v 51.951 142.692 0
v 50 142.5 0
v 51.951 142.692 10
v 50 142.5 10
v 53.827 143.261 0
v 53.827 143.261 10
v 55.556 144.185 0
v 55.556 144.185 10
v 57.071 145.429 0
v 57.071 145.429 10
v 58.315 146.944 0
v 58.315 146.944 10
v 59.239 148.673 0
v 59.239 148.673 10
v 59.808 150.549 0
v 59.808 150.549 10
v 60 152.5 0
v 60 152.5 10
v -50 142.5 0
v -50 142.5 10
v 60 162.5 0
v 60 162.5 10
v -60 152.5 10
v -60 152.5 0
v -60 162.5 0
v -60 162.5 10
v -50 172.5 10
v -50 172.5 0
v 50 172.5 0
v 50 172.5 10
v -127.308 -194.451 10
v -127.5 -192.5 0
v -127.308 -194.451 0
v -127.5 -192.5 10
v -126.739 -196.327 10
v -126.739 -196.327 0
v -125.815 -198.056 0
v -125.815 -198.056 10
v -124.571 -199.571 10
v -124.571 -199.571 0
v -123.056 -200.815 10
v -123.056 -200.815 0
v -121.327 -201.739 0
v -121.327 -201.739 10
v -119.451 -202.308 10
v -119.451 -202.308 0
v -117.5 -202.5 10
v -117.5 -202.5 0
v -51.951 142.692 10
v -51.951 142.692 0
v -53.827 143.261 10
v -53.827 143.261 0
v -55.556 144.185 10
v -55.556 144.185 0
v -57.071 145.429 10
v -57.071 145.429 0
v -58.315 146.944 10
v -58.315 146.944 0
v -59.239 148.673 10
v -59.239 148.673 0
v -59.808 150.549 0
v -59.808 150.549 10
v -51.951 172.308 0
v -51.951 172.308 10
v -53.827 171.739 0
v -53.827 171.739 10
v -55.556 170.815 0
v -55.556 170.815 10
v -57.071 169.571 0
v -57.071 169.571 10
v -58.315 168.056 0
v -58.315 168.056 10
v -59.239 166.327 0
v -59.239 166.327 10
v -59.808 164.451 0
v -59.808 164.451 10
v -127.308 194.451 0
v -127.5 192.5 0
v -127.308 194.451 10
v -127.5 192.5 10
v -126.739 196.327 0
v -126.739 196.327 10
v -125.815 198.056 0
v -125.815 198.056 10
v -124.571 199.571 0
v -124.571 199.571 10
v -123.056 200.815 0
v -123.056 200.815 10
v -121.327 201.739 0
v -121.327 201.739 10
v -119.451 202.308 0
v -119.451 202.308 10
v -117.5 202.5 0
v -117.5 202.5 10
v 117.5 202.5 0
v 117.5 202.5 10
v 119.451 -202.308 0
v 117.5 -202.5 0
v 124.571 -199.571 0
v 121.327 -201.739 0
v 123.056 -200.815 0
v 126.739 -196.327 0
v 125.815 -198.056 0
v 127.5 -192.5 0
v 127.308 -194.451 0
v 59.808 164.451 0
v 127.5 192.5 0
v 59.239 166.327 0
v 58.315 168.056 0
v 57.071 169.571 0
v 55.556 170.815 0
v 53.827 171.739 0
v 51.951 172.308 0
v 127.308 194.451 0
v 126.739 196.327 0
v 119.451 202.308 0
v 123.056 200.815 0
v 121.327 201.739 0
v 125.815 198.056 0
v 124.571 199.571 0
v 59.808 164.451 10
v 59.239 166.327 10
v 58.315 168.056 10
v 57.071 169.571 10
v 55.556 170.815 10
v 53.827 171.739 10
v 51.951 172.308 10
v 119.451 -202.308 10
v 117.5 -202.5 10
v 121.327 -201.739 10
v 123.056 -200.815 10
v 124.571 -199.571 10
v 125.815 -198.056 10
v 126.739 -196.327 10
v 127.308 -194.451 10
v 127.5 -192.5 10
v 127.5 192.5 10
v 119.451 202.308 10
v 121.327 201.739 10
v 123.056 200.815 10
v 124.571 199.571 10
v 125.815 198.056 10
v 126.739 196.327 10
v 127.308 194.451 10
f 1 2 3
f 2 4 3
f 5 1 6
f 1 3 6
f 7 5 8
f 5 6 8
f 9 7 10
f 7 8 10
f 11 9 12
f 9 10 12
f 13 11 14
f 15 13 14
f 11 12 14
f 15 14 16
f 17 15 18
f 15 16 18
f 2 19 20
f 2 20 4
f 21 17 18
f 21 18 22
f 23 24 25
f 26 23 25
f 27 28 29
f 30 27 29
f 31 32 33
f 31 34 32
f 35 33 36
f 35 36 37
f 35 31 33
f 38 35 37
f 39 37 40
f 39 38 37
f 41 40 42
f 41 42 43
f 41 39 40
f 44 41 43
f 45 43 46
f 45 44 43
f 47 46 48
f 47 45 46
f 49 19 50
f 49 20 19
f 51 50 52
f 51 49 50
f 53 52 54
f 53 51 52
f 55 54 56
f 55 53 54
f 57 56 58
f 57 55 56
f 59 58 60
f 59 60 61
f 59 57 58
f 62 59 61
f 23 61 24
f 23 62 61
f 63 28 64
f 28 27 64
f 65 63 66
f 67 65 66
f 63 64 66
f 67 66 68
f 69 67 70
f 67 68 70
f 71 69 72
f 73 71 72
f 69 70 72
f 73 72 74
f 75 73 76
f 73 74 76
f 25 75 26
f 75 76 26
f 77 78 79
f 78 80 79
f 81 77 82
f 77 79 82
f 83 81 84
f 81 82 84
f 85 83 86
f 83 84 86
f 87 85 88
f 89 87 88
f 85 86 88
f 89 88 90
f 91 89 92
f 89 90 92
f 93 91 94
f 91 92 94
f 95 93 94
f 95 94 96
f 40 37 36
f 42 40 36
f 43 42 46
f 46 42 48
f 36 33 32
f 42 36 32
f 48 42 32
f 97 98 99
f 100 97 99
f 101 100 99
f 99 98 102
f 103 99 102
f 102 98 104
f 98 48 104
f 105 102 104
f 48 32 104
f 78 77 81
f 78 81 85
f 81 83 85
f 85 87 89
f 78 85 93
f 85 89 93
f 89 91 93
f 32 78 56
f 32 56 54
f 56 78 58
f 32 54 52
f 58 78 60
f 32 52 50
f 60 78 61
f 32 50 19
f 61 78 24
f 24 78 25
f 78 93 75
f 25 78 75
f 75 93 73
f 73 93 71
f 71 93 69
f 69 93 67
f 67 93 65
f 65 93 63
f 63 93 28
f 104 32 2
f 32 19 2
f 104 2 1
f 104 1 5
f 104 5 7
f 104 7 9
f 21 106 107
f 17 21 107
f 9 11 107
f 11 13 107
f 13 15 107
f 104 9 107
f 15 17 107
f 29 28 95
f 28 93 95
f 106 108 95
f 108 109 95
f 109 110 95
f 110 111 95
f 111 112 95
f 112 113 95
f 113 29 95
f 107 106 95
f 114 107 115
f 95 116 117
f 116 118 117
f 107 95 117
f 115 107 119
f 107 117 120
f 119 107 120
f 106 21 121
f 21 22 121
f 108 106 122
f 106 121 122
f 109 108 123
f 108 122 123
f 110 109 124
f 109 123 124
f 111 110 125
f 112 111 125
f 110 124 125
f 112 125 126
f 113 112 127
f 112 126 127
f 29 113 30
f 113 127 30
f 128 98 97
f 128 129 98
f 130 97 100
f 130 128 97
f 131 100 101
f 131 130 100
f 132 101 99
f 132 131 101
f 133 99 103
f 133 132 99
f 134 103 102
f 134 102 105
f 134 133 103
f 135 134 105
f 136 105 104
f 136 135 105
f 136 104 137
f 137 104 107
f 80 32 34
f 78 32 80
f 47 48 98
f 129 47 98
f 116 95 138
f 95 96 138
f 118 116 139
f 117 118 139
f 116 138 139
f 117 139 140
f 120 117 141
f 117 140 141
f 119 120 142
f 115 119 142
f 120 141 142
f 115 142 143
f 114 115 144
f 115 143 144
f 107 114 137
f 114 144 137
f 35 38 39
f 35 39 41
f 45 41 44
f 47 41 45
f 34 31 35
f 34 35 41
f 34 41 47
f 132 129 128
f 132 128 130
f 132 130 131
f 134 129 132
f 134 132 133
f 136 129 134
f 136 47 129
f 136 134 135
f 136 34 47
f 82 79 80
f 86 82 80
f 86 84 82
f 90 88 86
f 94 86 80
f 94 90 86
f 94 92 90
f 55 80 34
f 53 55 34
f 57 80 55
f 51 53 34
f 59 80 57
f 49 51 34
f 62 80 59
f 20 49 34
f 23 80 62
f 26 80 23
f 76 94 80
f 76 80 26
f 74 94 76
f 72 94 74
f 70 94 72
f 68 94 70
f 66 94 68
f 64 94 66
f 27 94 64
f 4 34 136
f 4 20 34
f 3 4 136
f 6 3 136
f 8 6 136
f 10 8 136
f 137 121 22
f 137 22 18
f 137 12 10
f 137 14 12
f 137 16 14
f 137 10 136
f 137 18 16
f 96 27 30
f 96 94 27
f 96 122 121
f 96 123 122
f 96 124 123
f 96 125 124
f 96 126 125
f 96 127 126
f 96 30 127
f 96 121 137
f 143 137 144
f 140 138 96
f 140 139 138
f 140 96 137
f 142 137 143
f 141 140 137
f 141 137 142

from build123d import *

# Parameters (mm, degrees)
F0_W     = 255
F0_H     = 405
F0_W_2   = 120
F0_H_2   = 30
F1_DEPTH = 10
F2_R     = 10


with BuildPart() as f1:
    # F0 (on Top) → F1 (new body)
    with BuildSketch(Plane.XY):
        Rectangle(F0_W, F0_H)
        with Locations((0, 157.5)):
            Rectangle(F0_W_2, F0_H_2, mode=Mode.SUBTRACT)
    extrude(amount=F1_DEPTH)

    # F2
    f2_edges = [f1.edges().sort_by_distance(p)[0] for p in [
        (-127.5, 202.5, 5),
        (127.5, 202.5, 5),
        (60, 142.5, 5),
        (60, 172.5, 5),
        (-60, 172.5, 5),
        (-60, 142.5, 5),
        (127.5, -202.5, 5),
        (-127.5, -202.5, 5),
    ]]
    fillet(f2_edges, radius=F2_R)


solid = f1.part
